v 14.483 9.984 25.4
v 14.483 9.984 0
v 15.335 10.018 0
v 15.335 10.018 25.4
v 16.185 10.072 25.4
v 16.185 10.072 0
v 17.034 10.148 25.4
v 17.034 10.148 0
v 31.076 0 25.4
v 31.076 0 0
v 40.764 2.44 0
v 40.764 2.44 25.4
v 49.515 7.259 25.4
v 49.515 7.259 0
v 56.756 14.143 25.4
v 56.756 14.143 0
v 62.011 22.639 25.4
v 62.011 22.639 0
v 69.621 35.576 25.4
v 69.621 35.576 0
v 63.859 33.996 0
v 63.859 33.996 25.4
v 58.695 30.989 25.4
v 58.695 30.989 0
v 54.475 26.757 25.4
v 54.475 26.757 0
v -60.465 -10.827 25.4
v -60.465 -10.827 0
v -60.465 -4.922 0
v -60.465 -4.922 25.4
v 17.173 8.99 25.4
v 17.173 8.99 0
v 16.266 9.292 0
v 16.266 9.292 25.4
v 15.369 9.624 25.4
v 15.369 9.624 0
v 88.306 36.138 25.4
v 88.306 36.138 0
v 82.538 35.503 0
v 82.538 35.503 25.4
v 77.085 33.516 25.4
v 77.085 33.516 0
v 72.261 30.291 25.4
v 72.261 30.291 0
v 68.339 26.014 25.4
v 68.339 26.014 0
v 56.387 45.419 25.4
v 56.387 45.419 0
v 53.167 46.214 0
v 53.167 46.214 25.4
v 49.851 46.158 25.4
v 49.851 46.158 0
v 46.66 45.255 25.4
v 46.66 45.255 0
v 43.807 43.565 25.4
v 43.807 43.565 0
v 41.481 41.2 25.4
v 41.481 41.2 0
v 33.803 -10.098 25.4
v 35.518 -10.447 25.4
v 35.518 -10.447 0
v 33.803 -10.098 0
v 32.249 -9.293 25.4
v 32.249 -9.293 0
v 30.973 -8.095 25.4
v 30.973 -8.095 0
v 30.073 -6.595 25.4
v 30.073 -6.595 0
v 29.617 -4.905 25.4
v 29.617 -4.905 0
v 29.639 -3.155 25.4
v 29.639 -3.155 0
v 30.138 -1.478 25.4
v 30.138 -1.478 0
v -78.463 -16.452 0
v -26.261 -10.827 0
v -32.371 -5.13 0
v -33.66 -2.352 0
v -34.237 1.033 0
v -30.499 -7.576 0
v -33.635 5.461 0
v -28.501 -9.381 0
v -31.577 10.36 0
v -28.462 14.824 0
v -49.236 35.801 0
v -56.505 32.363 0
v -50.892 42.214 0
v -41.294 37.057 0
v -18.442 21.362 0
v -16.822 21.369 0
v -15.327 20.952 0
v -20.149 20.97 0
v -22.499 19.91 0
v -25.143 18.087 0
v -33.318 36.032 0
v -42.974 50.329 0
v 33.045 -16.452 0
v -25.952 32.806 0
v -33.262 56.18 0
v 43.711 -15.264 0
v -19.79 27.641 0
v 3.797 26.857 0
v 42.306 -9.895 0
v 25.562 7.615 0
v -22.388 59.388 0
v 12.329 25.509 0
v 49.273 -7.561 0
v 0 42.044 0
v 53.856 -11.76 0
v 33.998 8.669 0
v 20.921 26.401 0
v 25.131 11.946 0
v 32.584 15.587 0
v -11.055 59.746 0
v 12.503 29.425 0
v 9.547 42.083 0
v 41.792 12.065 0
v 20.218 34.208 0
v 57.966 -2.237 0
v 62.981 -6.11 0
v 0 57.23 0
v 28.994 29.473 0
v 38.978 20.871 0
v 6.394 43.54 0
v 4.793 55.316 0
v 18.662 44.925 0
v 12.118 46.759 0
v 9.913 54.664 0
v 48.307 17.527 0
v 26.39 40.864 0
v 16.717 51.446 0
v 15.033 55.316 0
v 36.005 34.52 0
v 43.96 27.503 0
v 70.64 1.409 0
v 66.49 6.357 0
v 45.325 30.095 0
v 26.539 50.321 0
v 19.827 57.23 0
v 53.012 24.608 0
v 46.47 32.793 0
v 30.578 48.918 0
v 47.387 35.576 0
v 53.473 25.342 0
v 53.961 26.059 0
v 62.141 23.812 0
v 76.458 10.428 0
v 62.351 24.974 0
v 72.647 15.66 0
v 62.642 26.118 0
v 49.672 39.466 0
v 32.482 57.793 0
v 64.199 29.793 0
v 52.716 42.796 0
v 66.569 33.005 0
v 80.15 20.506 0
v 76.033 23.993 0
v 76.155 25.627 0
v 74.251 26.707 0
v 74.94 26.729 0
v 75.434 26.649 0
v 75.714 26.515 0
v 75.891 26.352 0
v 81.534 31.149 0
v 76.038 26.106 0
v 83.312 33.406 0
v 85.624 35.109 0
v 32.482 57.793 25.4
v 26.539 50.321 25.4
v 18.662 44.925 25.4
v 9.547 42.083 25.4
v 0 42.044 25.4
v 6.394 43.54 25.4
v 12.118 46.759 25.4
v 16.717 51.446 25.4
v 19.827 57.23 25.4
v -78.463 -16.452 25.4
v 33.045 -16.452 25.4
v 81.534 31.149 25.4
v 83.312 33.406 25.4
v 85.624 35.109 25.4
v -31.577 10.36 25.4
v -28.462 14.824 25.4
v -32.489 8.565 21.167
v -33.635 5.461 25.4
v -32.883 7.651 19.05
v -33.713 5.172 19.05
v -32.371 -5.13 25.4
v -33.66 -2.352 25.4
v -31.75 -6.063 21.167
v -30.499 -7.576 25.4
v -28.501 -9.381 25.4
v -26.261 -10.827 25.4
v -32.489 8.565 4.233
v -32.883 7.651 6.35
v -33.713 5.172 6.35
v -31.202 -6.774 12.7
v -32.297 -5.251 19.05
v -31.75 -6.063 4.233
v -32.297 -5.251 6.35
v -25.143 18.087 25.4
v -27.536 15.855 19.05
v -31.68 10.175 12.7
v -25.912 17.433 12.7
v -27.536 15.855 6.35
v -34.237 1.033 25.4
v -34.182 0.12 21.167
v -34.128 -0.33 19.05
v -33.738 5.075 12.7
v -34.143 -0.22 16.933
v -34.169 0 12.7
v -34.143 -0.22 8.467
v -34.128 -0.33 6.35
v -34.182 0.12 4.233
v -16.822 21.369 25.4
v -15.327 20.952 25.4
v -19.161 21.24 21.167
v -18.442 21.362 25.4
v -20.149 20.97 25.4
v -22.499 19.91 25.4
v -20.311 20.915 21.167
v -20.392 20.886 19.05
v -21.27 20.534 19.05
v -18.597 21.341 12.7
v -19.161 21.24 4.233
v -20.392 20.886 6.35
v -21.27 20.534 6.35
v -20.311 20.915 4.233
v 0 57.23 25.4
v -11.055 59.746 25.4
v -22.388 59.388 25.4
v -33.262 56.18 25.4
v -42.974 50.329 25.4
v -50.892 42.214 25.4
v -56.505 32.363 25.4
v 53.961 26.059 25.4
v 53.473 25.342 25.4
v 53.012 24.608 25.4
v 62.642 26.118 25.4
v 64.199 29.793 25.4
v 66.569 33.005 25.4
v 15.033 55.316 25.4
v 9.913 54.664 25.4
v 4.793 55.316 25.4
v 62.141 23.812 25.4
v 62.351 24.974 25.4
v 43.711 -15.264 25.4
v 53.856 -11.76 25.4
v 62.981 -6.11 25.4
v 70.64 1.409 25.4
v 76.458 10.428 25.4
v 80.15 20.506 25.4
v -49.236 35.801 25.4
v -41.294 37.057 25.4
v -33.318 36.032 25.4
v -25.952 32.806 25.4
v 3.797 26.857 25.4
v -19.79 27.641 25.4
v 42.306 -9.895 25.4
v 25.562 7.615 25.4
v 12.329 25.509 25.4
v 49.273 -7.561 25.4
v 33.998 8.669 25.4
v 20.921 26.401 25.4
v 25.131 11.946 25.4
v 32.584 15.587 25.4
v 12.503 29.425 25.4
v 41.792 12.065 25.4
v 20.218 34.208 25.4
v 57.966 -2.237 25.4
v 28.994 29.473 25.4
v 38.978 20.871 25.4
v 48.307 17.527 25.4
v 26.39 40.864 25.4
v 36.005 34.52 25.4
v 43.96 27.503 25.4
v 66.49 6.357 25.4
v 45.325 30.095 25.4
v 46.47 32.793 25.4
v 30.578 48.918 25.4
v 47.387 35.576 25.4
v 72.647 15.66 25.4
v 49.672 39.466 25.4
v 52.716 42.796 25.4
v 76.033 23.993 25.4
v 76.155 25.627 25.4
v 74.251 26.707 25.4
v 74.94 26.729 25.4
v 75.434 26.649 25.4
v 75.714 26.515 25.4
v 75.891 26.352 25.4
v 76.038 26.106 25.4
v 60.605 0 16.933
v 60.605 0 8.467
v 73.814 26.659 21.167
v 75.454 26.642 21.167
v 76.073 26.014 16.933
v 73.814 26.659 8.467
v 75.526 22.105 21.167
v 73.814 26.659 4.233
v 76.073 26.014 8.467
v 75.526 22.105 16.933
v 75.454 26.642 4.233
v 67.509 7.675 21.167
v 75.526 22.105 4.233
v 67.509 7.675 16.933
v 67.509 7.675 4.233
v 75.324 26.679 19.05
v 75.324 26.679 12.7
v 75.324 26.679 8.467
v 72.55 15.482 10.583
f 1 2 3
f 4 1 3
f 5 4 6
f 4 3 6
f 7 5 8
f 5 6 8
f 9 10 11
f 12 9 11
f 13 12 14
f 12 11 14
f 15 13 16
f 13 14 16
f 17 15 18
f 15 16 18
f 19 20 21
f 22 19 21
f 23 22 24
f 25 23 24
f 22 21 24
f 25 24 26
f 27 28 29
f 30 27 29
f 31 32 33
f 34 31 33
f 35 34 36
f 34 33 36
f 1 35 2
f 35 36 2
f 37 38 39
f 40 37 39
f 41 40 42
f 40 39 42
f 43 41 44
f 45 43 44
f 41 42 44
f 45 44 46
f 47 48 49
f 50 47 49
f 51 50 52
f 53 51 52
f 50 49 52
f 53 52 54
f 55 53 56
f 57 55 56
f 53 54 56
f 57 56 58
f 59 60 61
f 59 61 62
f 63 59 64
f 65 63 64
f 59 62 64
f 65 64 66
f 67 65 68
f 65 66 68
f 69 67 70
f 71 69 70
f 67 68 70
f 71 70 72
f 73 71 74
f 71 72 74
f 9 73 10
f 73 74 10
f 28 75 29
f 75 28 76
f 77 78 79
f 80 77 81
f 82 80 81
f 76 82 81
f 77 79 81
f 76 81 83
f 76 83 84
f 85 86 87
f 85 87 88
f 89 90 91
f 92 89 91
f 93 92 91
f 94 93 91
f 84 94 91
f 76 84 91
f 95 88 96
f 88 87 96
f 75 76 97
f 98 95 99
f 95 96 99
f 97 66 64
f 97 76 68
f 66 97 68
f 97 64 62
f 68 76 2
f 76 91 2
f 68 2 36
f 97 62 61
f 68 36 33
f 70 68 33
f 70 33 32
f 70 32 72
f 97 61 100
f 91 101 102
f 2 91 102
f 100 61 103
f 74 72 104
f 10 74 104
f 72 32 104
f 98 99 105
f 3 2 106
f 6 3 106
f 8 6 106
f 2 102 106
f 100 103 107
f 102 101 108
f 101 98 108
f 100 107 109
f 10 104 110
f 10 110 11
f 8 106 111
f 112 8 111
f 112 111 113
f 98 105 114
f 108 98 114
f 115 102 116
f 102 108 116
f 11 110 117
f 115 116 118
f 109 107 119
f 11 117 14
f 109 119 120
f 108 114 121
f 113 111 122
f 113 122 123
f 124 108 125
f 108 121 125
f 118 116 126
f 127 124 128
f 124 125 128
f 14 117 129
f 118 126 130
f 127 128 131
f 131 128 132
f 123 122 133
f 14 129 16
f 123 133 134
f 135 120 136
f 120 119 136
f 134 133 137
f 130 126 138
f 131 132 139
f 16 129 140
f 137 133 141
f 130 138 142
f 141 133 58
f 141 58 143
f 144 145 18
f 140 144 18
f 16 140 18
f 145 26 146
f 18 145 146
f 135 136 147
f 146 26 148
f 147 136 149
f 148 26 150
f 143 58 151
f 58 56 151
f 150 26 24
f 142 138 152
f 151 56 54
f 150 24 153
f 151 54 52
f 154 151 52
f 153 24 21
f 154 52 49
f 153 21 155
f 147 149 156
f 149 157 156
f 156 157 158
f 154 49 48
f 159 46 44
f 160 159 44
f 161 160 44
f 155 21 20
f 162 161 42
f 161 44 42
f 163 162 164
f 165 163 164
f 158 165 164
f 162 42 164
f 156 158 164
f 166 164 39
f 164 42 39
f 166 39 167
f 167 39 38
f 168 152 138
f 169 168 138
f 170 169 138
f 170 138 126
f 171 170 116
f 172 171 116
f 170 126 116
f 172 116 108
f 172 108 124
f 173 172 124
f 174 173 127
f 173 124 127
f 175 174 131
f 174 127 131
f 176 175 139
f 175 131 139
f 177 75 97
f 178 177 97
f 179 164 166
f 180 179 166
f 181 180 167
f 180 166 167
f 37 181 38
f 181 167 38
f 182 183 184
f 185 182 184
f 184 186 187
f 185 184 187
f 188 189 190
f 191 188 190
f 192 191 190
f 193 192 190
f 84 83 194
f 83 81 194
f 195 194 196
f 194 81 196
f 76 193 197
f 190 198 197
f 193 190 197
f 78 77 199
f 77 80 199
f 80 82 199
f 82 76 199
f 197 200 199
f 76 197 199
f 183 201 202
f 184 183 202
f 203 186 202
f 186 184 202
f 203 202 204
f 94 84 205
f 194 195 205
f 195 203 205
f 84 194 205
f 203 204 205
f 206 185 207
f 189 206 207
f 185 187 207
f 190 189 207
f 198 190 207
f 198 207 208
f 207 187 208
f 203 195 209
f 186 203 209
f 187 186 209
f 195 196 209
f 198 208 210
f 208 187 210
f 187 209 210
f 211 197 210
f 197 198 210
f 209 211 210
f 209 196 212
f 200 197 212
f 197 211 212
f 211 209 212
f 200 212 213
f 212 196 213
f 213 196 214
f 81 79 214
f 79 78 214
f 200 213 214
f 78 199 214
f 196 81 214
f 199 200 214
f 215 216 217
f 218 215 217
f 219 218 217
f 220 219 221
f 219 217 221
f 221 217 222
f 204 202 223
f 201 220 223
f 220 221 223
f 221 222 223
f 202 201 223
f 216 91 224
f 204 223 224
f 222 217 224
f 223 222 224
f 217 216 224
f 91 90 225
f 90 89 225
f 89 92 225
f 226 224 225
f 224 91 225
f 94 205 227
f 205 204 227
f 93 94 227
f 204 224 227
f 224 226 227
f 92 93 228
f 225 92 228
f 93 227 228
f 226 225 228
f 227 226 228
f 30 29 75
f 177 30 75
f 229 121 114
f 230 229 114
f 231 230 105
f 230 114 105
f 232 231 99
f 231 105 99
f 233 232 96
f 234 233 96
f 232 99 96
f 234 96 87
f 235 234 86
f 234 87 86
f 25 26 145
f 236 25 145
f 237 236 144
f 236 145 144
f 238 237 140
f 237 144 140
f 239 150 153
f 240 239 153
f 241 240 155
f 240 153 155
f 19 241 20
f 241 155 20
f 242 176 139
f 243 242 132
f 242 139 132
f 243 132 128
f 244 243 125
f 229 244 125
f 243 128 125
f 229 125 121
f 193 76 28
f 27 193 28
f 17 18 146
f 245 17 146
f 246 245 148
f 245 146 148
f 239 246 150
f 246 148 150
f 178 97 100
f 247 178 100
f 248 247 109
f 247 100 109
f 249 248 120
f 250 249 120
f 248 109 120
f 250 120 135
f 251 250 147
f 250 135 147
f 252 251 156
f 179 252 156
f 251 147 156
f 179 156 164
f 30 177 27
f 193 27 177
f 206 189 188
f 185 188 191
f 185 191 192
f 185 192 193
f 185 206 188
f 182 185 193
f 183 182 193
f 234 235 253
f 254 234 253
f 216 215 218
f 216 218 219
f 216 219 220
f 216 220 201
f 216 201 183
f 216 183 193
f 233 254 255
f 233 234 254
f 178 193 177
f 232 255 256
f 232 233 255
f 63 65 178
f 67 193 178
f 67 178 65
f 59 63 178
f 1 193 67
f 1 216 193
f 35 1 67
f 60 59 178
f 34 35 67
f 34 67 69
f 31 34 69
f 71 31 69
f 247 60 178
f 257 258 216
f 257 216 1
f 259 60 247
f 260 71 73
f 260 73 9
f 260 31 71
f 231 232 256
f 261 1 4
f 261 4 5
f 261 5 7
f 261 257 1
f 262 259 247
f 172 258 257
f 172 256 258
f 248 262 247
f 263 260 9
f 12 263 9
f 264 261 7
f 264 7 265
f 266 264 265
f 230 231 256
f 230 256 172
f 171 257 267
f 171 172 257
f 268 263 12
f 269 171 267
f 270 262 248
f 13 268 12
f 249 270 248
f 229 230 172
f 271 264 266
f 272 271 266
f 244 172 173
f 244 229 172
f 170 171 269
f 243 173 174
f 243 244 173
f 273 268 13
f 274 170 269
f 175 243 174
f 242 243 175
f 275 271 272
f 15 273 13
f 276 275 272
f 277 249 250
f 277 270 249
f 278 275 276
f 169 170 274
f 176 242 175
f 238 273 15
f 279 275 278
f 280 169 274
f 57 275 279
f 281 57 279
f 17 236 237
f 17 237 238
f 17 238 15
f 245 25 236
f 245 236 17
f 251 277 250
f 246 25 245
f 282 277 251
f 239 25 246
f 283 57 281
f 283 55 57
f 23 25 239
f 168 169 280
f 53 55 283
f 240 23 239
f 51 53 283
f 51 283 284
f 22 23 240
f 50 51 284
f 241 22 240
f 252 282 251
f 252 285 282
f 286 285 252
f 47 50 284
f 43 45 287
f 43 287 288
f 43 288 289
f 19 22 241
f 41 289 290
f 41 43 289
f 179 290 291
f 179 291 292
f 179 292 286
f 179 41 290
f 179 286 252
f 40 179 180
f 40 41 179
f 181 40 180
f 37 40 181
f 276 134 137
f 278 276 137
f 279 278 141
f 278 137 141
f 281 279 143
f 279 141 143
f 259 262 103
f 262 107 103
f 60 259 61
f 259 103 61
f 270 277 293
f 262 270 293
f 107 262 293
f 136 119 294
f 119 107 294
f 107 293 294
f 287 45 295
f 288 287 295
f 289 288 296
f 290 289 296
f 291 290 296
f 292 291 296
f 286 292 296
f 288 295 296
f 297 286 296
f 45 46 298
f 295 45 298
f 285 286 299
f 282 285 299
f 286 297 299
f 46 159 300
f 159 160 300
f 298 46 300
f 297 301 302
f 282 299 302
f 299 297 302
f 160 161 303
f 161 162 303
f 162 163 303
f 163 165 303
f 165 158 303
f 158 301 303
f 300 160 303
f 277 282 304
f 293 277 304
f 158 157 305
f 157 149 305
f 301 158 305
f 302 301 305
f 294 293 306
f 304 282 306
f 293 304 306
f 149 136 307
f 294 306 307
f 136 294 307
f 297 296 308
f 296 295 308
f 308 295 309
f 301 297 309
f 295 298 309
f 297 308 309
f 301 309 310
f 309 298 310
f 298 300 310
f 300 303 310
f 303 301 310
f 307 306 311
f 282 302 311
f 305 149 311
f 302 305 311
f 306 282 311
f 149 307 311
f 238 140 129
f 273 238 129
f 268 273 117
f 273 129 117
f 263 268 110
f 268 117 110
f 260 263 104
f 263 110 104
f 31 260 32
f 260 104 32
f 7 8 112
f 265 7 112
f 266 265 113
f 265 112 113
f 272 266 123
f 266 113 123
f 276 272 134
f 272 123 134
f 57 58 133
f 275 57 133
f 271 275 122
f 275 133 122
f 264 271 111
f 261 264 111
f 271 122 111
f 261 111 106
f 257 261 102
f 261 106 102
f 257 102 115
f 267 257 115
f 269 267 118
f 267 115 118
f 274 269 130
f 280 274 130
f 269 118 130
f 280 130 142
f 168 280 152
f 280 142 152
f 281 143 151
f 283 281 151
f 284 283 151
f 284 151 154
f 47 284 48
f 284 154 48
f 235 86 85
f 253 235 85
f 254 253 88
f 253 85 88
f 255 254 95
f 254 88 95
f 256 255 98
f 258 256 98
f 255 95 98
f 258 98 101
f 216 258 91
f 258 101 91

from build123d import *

# Parameters (mm, degrees)
F1_DEPTH = 25.4


with BuildPart() as f1:
    # F0 (on Top) → F1 (new body)
    with BuildSketch(Plane.XY):
        with BuildLine():
            add(Edge.make_bspline(
                [(-26.2610681984, -10.8273644), (-22.3250154222, -12.9399033802), (-6.7541943176, -14.1664240285), (-7.861061568, 17.5830890308), (-15.3270475566, 20.9516510367)],
                knots=[0.4911658302, 0.4911658302, 0.4911658302, 0.4911658302, 0.6402639099, 1, 1, 1, 1], degree=3))
            add(Edge.make_bspline(
                [(-15.3270475566, 20.9516510367), (-22.3564971203, 24.123253121), (-41.1418845104, 4.1977350509), (-30.2859655215, -8.6671412095), (-26.2610681984, -10.8273644)],
                knots=[0, 0, 0, 0, 0.3387023101, 0.4911658302, 0.4911658302, 0.4911658302, 0.4911658302], degree=3))
        make_face()
        with BuildLine():
            add(Edge.make_bspline(
                [(35.5182294418, -10.447258051), (31.9129186826, -10.220612291), (23.1955555043, -7.2820451281), (18.0529932429, 2.8715139484), (17.1729191086, 8.9899072036)],
                knots=[0.4660645619, 0.4660645619, 0.4660645619, 0.4660645619, 0.5346510085, 0.6442786993, 0.6442786993, 0.6442786993, 0.6442786993], degree=3))
            ThreePointArc((35.5182294418, -10.447258051), (30.0729748302, -6.5945561838), (31.0759395361, 0))
            ThreePointArc((31.0759395361, 0), (49.5151308357, 7.2590451113), (62.0112679899, 22.6390343159))
            ThreePointArc((62.0112679899, 22.6390343159), (62.2358256831, 24.395139963), (62.6415775007, 26.1184213282))
            add(Edge.make_bspline(
                [(54.4754700357, 26.7574300255), (57.3752815642, 26.5086516013), (60.1433747449, 26.2647226636), (62.6415775007, 26.1184213282)],
                knots=[0.9219128776, 0.9219128776, 0.9219128776, 0.9219128776, 0.9641346796, 0.9641346796, 0.9641346796, 0.9641346796], degree=3))
            ThreePointArc((54.4754700357, 26.7574300255), (53.7133787969, 25.7031684966), (53.0118979514, 24.6076434851))
            ThreePointArc((53.0118979514, 24.6076434851), (38.016967787, 10.0876095615), (17.1729191086, 8.9899072036))
        make_face()
        with BuildLine():
            ThreePointArc((-56.50515552, 32.3630547615), (-33.3182753375, 36.0316218628), (-15.3270475566, 20.9516510367))
            add(Edge.make_bspline(
                [(-26.2610681984, -10.8273644), (-22.3250154222, -12.9399033802), (-6.7541943176, -14.1664240285), (-7.861061568, 17.5830890308), (-15.3270475566, 20.9516510367)],
                knots=[0.4911658302, 0.4911658302, 0.4911658302, 0.4911658302, 0.6402639099, 1, 1, 1, 1], degree=3))
            Line((-26.2610681984, -10.8273644), (-60.464620338, -10.8273644))
            Line((-60.464620338, -10.8273644), (-60.464620338, -4.9215289764))
            Line((-60.464620338, -4.9215289764), (-78.4632340074, -16.4519678801))
            Line((-78.4632340074, -16.4519678801), (-14.9052012712, -16.4519678801))
            Line((-14.9052012712, -16.4519678801), (33.0445505679, -16.4519678801))
            ThreePointArc((33.0445505679, -16.4519678801), (67.0192612888, -2.5629170358), (81.5344079335, 31.1490573918))
            ThreePointArc((81.5344079335, 31.1490573918), (84.4106855525, 34.3353672495), (88.3062928915, 36.1380837858))
            ThreePointArc((88.3062928915, 36.1380837858), (77.0854781582, 33.5158631028), (68.3389529586, 26.0137952864))
            add(Edge.make_bspline(
                [(68.3389529586, 26.0137952864), (73.13500471, 26.2276507448), (80.3696253608, 30.0761350301), (65.6763095341, -1.3650666606), (43.6762193769, -10.9601053344), (35.5182294418, -10.447258051)],
                knots=[0, 0, 0, 0, 0.1043811632, 0.3108691907, 0.4660645619, 0.4660645619, 0.4660645619, 0.4660645619], degree=3))
            add(Edge.make_bspline(
                [(35.5182294418, -10.447258051), (31.9129186826, -10.220612291), (23.1955555043, -7.2820451281), (18.0529932429, 2.8715139484), (17.1729191086, 8.9899072036)],
                knots=[0.4660645619, 0.4660645619, 0.4660645619, 0.4660645619, 0.5346510085, 0.6442786993, 0.6442786993, 0.6442786993, 0.6442786993], degree=3))
            ThreePointArc((17.1729191086, 8.9899072036), (15.8161613784, 9.4543765839), (14.4833568484, 9.9836736917))
            ThreePointArc((14.4833568484, 9.9836736917), (15.7599932562, 10.0425488454), (17.0336540583, 10.1476914274))
            add(Edge.make_bspline(
                [(17.0336540583, 10.1476914274), (16.5524367293, 15.1345962527), (19.2361600934, 26.9166935874), (34.5605586177, 27.9160004318), (43.9602541666, 27.5027224979)],
                knots=[0.6512070875, 0.6512070875, 0.6512070875, 0.6512070875, 0.7409649976, 0.872432959, 0.872432959, 0.872432959, 0.872432959], degree=3))
            ThreePointArc((43.9602541666, 27.5027224979), (45.9259805238, 31.4321090753), (47.3872944713, 35.5756245553))
            ThreePointArc((47.3872944713, 35.5756245553), (51.1063153143, 41.2109006624), (56.3866607845, 45.4186797142))
            ThreePointArc((56.3866607845, 45.4186797142), (48.2264153253, 45.809802792), (41.481461376, 41.2002280354))
            ThreePointArc((41.481461376, 41.2002280354), (25.0576689955, 27.6740129875), (3.7966074888, 26.8574878573))
            ThreePointArc((3.7966074888, 26.8574878573), (23.5274065425, 37.3289516325), (32.4820913374, 57.7928125858))
            ThreePointArc((32.4820913374, 57.7928125858), (18.6619239349, 44.9253049217), (0, 42.0439206064))
            ThreePointArc((0, 42.0439206064), (12.1179065959, 46.7589869992), (19.8267325759, 57.2303533554))
            ThreePointArc((19.8267325759, 57.2303533554), (9.9133662879, 54.6642939776), (0, 57.2303533554))
            ThreePointArc((0, 57.2303533554), (-33.2620682112, 56.1796066262), (-56.50515552, 32.3630547615))
        make_face()
        with BuildLine():
            ThreePointArc((17.0336540583, 10.1476914274), (32.5838091219, 15.5874190212), (43.9602541666, 27.5027224979))
            add(Edge.make_bspline(
                [(17.0336540583, 10.1476914274), (16.5524367293, 15.1345962527), (19.2361600934, 26.9166935874), (34.5605586177, 27.9160004318), (43.9602541666, 27.5027224979)],
                knots=[0.6512070875, 0.6512070875, 0.6512070875, 0.6512070875, 0.7409649976, 0.872432959, 0.872432959, 0.872432959, 0.872432959], degree=3))
        make_face()
        with BuildLine():
            add(Edge.make_bspline(
                [(54.4754700357, 26.7574300255), (57.3752815642, 26.5086516013), (60.1433747449, 26.2647226636), (62.6415775007, 26.1184213282)],
                knots=[0.9219128776, 0.9219128776, 0.9219128776, 0.9219128776, 0.9641346796, 0.9641346796, 0.9641346796, 0.9641346796], degree=3))
            ThreePointArc((62.6415775007, 26.1184213282), (65.2892454144, 31.4686261622), (69.6213813016, 35.5756245553))
            ThreePointArc((69.6213813016, 35.5756245553), (61.1788209316, 32.6601387253), (54.4754700357, 26.7574300255))
        make_face()
    extrude(amount=F1_DEPTH)


solid = f1.part
